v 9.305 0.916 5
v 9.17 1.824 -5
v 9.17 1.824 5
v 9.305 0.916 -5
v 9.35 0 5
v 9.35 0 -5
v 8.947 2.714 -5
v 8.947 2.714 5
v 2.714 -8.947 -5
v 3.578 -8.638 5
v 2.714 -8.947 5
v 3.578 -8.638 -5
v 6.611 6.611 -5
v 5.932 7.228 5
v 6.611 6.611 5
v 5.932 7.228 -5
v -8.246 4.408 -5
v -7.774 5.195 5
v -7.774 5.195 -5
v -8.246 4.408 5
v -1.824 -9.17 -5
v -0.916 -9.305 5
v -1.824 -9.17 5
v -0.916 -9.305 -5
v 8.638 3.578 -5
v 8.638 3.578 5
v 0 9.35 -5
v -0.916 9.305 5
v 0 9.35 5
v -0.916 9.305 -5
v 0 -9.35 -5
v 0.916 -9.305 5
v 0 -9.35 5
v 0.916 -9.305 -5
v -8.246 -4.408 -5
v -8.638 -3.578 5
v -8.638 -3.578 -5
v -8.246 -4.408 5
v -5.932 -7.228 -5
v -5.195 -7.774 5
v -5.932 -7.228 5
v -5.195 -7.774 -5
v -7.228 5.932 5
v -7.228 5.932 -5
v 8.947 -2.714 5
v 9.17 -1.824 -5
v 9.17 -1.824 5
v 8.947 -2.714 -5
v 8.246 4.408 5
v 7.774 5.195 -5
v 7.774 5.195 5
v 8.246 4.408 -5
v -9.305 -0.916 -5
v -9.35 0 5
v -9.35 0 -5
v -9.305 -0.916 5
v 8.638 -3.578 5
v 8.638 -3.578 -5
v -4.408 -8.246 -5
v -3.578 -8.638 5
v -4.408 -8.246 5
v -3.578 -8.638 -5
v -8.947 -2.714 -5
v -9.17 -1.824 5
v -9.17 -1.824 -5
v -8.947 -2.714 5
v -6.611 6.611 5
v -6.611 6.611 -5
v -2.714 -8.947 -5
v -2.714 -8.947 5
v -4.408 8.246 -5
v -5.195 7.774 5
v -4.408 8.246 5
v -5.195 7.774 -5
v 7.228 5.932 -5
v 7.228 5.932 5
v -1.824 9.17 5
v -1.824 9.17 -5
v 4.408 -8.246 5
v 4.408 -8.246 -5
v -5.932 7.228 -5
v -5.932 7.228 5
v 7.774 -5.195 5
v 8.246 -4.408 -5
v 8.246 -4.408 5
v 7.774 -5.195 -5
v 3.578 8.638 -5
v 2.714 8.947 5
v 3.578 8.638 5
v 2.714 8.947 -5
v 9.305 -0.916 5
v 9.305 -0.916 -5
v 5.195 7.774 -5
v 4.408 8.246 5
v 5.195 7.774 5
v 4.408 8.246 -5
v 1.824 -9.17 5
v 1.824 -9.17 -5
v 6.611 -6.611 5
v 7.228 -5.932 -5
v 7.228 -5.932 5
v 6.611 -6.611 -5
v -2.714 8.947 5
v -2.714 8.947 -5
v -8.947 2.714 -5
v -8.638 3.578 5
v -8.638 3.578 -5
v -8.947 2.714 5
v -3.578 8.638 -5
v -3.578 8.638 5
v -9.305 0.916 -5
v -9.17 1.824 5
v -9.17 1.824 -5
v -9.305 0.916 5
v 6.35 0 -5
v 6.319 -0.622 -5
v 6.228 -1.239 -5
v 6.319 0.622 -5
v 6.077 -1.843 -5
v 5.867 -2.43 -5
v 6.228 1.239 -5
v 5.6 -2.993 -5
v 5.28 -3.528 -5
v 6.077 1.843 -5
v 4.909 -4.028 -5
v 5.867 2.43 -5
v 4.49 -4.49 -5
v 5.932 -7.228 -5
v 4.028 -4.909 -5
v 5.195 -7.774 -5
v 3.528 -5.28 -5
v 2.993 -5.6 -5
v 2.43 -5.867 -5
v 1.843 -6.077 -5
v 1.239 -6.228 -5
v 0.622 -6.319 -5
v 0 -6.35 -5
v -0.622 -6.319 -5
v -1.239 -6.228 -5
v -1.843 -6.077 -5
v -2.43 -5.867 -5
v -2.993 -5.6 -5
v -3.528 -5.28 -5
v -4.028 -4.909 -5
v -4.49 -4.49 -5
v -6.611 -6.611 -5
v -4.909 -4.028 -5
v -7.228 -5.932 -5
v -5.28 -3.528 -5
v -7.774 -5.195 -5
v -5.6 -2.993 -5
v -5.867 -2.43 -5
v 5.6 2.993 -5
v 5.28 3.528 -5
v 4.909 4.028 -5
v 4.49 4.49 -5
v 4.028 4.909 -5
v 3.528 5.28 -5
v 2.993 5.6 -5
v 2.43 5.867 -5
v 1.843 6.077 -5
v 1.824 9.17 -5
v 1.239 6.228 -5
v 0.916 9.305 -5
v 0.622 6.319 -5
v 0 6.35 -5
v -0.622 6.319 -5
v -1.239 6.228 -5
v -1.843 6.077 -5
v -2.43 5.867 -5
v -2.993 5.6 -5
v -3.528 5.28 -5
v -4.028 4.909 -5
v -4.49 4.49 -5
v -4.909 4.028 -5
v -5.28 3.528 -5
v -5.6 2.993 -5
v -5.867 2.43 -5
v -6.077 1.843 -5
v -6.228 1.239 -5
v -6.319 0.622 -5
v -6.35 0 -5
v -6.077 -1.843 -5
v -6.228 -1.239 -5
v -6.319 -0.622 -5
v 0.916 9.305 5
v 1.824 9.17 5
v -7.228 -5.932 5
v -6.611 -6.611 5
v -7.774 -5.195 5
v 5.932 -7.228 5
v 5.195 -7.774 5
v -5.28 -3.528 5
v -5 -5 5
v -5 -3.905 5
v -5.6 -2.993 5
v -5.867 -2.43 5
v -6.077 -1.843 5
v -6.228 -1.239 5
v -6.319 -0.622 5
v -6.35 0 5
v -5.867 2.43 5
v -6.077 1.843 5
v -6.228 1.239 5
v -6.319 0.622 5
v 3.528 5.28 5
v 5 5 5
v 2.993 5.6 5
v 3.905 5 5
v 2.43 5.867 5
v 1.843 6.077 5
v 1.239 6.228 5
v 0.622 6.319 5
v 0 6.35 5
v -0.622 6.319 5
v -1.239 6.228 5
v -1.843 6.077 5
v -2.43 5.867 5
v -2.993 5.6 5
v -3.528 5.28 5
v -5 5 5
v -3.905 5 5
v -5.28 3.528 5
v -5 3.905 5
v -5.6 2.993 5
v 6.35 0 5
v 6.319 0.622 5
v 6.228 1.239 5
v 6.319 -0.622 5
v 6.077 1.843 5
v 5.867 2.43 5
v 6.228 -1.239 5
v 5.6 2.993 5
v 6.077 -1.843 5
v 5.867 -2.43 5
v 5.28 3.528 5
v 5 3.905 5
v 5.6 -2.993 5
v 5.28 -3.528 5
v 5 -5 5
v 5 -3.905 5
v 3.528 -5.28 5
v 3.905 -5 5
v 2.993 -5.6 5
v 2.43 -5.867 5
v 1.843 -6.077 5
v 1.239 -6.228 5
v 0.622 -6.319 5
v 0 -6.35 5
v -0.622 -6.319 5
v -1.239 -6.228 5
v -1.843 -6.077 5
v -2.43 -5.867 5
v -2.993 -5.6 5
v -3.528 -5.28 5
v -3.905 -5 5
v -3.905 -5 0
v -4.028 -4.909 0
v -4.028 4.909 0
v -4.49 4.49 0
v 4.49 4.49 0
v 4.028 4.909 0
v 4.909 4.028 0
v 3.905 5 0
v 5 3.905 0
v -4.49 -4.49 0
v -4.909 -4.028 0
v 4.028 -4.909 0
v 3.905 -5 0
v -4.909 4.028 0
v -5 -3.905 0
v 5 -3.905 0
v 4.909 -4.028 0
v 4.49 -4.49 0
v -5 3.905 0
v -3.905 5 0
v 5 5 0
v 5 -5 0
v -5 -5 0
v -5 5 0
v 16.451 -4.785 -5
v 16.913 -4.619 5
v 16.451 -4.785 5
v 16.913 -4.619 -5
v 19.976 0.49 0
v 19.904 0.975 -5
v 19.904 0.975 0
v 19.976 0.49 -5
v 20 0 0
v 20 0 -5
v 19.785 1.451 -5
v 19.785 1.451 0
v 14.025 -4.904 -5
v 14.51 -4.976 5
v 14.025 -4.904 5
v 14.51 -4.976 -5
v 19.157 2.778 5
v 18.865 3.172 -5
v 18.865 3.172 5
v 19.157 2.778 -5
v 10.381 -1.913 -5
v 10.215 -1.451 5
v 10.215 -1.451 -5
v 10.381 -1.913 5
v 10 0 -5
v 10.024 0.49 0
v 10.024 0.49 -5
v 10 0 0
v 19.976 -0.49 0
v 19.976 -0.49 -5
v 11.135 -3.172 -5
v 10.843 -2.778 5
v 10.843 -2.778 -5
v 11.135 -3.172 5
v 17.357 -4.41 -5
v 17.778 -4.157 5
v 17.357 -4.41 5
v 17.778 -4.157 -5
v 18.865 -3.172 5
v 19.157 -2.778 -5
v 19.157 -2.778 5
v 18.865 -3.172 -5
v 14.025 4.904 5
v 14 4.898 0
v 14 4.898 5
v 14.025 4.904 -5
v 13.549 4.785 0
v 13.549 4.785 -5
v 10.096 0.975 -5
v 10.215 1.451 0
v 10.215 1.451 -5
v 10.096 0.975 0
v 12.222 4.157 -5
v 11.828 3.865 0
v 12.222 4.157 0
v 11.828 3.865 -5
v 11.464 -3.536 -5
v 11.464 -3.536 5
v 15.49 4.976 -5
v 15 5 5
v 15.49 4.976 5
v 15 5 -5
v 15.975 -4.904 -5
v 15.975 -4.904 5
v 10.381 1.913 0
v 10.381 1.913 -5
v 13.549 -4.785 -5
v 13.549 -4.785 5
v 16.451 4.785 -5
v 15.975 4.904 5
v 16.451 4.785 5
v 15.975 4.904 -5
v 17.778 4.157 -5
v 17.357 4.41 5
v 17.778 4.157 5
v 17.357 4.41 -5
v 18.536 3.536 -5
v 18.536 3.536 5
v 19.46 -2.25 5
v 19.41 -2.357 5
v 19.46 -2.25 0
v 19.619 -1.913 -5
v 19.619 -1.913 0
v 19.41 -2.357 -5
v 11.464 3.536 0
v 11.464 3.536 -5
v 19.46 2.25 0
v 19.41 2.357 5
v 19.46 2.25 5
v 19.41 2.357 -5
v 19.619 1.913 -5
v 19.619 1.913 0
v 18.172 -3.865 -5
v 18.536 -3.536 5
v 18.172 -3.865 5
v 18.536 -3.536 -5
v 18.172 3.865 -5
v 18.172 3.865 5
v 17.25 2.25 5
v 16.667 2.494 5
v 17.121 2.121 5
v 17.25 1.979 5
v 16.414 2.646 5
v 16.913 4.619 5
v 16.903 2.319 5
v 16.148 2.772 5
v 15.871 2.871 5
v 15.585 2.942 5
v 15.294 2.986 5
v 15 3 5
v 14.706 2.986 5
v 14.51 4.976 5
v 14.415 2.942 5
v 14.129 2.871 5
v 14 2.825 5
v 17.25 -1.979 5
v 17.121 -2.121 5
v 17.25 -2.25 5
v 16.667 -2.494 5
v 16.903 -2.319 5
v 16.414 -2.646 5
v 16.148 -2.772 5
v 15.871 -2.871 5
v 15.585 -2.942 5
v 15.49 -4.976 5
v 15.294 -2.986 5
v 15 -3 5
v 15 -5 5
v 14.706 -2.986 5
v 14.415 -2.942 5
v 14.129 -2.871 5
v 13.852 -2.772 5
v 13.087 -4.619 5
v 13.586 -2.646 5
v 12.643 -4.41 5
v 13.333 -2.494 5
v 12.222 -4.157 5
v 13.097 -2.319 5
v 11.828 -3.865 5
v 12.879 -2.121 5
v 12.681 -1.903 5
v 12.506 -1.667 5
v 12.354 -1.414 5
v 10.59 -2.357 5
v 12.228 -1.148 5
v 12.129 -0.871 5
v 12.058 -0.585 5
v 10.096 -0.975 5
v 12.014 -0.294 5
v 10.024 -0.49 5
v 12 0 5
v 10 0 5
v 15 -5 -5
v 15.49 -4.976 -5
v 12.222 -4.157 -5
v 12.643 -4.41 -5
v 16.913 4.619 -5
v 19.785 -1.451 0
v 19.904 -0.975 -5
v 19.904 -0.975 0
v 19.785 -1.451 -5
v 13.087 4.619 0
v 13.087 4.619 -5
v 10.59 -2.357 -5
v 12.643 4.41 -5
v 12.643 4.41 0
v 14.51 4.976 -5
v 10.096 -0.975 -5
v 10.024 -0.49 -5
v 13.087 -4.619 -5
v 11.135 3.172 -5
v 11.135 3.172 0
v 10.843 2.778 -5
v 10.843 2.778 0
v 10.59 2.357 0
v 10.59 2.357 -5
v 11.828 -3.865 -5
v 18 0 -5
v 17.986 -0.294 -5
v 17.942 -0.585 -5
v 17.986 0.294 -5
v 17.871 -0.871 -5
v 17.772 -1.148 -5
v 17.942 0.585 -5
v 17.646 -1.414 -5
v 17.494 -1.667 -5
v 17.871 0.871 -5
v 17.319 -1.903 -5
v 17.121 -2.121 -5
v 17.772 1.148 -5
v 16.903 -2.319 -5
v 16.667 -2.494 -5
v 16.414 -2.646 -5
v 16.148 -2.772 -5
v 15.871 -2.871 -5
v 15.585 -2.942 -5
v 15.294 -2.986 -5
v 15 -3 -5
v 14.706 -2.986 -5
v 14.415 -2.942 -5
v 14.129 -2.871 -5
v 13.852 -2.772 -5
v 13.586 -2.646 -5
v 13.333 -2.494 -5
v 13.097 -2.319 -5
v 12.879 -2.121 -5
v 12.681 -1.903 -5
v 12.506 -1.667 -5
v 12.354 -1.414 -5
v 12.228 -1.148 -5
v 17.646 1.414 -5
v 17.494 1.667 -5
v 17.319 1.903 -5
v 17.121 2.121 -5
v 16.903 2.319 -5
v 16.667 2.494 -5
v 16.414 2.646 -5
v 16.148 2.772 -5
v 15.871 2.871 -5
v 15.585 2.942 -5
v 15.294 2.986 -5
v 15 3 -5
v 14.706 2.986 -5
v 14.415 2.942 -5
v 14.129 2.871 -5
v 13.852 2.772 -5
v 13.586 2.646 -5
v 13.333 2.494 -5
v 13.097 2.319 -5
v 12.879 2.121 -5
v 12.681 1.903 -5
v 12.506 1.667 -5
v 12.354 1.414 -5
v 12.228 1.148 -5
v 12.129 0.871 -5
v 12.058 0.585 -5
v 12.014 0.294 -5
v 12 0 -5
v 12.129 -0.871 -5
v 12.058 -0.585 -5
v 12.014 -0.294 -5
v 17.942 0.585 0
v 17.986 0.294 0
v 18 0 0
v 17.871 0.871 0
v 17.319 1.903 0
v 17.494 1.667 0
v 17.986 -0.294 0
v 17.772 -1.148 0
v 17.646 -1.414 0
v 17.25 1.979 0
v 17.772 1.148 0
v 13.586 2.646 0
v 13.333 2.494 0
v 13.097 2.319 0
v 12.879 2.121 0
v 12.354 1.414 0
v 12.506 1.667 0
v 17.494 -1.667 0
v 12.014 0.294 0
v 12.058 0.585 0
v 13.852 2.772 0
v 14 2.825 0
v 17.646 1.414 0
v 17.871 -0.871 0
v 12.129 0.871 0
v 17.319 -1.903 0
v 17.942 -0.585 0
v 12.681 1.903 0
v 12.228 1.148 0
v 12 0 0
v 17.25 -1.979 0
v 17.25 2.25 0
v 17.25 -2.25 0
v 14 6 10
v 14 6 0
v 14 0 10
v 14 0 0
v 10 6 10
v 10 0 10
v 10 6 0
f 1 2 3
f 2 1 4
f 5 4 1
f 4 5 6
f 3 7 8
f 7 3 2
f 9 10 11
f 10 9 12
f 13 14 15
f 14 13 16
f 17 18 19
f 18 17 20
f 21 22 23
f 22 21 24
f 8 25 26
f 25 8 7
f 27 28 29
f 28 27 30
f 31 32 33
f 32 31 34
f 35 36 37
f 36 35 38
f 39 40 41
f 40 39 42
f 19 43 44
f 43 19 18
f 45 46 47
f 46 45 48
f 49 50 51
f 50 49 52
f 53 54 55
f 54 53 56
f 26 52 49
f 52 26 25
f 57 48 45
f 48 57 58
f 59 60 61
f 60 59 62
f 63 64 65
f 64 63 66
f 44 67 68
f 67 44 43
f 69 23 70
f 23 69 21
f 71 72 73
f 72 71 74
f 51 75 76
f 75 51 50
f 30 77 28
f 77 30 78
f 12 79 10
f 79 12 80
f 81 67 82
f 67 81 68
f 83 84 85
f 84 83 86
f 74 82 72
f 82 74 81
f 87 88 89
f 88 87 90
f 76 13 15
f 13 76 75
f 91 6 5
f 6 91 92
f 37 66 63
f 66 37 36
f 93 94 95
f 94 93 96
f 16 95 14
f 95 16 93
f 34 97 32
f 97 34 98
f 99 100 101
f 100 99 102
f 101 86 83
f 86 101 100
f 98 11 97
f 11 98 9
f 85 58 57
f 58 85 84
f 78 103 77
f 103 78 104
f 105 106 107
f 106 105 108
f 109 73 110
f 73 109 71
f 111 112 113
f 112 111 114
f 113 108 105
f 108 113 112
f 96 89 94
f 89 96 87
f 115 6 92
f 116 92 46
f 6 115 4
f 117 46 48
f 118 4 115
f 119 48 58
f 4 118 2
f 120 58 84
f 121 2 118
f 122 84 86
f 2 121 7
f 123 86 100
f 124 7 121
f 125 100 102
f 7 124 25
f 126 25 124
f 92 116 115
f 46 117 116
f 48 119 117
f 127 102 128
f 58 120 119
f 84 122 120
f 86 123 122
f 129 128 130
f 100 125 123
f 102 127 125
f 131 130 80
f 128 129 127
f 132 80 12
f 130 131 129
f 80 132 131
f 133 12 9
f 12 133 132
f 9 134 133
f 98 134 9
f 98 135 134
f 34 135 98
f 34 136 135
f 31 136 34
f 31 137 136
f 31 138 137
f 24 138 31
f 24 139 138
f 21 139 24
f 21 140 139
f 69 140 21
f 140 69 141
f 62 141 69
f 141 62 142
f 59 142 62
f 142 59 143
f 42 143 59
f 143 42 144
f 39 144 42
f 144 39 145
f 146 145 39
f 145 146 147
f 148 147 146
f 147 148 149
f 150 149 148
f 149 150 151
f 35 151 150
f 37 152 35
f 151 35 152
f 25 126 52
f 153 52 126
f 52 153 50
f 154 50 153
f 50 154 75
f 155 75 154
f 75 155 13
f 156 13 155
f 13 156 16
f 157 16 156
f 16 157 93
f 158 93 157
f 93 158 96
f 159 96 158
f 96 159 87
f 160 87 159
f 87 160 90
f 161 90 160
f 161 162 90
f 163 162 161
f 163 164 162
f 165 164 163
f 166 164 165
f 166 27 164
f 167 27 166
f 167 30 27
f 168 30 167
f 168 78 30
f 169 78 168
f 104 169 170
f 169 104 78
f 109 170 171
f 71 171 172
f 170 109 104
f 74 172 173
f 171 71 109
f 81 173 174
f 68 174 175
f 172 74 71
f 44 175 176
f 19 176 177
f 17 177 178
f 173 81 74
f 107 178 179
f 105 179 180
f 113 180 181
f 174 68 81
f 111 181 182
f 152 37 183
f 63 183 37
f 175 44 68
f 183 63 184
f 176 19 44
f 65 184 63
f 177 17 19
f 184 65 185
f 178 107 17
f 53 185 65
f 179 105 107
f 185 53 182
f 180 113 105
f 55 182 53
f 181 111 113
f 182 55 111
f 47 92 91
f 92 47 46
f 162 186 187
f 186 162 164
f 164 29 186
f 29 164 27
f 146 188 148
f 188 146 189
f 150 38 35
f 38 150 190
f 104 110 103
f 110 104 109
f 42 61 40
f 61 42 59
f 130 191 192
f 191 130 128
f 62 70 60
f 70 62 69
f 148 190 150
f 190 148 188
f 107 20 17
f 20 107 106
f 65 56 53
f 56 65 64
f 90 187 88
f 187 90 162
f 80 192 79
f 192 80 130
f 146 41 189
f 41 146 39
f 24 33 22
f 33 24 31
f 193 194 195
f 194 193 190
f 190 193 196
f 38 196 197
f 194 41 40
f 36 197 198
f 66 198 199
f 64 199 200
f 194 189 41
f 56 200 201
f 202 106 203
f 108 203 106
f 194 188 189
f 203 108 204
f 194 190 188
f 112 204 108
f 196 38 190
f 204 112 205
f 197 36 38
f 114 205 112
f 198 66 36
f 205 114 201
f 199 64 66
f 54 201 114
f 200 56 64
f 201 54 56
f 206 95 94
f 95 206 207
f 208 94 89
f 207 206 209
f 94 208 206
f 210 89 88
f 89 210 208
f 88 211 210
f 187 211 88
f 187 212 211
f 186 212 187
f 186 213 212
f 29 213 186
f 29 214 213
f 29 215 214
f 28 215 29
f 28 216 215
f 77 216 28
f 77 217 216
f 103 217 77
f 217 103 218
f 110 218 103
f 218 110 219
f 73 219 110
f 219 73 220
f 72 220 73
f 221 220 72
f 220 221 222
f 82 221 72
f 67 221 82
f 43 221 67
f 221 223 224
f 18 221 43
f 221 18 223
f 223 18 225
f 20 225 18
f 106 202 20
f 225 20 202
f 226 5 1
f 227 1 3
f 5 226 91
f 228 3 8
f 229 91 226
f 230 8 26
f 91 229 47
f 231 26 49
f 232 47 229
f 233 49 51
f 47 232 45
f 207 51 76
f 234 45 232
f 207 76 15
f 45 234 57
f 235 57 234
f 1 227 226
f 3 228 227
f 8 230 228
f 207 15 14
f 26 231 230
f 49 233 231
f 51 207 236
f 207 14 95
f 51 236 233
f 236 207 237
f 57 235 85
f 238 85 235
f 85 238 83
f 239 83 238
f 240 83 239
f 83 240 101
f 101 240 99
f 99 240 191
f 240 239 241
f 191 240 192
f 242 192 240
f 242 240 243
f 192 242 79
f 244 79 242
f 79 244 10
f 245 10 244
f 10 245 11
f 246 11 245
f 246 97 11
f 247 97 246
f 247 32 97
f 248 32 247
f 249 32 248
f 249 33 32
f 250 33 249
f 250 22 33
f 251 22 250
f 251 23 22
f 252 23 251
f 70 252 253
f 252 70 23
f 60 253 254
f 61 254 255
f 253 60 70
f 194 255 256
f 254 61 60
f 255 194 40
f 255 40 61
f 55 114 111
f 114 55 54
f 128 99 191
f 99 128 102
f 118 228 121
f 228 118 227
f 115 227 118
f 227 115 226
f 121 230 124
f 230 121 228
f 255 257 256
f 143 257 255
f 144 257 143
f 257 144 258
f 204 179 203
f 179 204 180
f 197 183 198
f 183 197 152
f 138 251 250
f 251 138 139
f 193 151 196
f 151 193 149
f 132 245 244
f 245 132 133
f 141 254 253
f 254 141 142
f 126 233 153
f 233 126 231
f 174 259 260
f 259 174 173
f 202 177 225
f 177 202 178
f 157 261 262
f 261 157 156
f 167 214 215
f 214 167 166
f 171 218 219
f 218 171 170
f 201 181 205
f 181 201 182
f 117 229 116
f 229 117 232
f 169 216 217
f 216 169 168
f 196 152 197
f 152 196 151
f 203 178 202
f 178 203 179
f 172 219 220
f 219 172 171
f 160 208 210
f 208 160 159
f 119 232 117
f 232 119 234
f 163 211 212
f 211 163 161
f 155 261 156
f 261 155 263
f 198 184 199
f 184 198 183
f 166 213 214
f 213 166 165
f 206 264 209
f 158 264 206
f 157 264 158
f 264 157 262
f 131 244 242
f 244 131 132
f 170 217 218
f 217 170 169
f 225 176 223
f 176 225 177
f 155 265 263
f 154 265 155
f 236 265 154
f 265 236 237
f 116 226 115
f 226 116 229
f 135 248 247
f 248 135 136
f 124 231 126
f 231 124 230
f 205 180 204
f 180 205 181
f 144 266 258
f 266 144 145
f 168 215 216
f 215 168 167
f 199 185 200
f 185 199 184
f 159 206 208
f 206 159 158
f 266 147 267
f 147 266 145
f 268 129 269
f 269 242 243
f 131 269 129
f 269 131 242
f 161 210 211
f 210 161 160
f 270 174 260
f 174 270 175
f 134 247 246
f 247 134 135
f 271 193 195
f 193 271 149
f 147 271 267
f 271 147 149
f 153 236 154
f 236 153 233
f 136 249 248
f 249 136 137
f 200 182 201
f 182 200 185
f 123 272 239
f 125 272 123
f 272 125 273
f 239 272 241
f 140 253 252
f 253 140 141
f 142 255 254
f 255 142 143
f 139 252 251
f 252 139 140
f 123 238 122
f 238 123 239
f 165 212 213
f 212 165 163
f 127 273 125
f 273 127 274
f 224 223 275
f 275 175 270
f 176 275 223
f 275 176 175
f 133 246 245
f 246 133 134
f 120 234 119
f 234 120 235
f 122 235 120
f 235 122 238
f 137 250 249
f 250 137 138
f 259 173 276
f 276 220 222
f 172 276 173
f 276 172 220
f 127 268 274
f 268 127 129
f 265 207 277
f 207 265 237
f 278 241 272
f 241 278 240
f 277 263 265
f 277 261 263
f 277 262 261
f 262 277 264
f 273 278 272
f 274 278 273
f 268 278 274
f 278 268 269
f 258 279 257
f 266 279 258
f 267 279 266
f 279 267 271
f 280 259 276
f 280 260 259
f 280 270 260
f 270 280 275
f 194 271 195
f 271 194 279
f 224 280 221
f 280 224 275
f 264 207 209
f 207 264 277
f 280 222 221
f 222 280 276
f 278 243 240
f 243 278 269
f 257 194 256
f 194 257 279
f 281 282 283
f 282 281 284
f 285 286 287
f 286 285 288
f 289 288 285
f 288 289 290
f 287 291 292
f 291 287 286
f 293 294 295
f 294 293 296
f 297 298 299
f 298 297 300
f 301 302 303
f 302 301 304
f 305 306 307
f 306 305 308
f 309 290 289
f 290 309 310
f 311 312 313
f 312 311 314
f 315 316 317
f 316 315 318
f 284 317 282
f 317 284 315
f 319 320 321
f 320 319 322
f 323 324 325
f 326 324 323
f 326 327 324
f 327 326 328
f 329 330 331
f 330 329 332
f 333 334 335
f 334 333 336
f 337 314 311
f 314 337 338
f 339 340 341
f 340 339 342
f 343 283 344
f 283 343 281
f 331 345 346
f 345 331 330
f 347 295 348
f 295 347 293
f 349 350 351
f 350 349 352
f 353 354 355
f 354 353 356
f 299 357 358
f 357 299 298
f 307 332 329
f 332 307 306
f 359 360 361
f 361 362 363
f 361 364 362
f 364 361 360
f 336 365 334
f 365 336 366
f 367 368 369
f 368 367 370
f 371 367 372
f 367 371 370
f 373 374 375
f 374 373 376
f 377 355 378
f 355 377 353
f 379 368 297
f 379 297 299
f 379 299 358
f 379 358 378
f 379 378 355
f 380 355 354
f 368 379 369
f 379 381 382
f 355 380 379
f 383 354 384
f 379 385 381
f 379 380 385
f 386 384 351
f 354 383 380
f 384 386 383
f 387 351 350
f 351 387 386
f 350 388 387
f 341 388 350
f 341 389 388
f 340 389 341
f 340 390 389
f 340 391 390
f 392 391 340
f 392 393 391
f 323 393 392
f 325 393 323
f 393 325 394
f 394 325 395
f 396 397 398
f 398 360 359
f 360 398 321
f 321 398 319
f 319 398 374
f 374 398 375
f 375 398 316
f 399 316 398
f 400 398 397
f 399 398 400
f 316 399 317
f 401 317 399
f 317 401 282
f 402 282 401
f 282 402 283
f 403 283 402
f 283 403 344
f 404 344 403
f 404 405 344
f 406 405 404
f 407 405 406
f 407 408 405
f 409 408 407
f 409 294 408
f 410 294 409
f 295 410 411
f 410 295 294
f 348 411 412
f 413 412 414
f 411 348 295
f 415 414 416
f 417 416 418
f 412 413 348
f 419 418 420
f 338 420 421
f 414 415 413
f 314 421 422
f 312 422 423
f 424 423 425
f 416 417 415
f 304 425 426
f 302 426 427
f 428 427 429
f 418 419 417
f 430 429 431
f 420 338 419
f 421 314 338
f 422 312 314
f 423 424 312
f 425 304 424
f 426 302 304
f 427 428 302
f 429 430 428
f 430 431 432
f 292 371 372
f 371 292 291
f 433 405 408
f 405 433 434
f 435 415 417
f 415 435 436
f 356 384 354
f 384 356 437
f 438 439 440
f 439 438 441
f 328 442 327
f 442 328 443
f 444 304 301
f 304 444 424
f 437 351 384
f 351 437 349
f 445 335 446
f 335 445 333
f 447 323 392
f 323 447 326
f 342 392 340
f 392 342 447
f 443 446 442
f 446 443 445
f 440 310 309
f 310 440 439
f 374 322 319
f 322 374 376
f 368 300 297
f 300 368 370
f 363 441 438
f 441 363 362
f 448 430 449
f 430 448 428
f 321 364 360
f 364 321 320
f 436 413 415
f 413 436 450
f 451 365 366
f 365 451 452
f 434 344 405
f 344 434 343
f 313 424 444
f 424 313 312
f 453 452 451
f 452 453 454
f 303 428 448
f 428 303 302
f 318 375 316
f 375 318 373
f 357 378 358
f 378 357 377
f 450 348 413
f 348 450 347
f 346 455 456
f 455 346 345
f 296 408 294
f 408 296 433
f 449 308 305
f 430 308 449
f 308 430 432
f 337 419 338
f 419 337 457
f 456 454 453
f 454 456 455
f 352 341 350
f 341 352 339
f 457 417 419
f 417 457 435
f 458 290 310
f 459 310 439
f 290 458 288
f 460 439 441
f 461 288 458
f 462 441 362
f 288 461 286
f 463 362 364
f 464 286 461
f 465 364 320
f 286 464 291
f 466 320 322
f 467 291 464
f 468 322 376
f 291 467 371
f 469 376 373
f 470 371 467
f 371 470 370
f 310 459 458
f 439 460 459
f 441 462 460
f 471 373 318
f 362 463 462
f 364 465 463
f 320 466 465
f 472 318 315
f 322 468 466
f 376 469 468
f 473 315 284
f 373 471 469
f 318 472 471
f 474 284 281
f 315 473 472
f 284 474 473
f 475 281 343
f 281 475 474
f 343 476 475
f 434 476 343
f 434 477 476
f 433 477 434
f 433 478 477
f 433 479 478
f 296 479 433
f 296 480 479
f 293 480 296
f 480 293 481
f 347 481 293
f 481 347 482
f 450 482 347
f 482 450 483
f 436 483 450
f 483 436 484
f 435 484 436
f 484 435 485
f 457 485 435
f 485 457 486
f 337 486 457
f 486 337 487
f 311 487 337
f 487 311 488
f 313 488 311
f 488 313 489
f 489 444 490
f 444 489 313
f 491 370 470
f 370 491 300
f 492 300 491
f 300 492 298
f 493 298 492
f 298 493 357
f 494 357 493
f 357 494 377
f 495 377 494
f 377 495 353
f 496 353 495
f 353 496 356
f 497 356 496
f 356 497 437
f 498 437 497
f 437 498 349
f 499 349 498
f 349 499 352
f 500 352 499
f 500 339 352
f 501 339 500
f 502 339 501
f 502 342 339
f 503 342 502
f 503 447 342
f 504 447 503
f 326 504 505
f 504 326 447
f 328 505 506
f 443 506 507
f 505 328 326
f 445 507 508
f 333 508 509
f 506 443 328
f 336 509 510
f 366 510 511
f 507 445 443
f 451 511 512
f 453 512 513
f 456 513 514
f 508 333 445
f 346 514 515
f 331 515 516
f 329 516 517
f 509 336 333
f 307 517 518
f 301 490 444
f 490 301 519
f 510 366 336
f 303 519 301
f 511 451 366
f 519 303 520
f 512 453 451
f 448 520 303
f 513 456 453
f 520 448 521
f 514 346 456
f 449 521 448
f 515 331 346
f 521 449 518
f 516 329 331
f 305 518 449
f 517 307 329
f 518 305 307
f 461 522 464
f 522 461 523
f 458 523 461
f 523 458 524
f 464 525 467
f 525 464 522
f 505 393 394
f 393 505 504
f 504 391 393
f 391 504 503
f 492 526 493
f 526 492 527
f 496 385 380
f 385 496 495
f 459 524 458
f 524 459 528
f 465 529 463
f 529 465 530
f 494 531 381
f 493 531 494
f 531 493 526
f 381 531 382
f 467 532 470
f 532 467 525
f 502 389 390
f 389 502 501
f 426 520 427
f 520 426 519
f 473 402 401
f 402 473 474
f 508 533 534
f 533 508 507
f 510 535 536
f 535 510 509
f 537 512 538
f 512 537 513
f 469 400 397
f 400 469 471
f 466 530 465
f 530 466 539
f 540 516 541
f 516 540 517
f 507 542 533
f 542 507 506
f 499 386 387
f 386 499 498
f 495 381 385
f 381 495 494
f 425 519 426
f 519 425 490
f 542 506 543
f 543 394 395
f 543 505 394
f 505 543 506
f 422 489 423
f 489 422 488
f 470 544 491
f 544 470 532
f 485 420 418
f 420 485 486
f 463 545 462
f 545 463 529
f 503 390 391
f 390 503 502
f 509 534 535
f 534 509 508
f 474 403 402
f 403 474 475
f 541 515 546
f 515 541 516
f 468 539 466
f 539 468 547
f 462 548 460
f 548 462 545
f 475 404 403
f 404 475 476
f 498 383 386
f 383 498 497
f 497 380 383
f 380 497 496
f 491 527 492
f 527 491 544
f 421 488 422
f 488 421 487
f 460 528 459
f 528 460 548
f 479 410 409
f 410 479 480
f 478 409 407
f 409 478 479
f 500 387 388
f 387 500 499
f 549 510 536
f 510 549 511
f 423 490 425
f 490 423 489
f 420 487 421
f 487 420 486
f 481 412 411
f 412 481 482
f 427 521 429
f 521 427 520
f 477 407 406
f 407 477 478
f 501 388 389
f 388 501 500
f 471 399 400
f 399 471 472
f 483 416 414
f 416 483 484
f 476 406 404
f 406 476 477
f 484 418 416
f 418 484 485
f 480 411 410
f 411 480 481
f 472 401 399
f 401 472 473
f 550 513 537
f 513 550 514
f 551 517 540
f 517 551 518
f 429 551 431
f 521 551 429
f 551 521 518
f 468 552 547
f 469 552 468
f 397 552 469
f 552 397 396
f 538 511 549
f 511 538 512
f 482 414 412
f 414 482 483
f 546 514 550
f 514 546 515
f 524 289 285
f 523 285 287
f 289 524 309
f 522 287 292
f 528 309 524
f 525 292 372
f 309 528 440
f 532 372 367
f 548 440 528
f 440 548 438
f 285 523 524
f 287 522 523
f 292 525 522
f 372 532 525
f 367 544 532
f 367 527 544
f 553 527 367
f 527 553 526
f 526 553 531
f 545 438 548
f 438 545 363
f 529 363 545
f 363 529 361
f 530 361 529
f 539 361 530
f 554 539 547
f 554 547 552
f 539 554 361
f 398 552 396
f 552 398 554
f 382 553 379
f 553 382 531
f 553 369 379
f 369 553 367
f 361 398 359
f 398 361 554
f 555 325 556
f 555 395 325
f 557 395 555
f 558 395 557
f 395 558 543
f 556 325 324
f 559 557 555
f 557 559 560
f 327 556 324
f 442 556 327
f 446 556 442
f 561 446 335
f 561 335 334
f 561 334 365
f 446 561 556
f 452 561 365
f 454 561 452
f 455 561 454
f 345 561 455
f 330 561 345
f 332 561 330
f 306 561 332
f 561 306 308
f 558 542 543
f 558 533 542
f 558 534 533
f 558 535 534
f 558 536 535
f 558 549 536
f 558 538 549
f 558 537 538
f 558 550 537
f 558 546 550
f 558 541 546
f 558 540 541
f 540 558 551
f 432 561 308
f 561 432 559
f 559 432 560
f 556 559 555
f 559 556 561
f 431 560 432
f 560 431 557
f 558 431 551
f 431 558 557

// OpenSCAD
// Snap-on Clip for Lab Stand Rod and Tubing
// Orientation: Flat on XY plane, building up in +Z.
// Units: Millimetres.

// --- Dimensions ---
// Rod Stand
$rod_diameter = 12.7;
$rod_wall_thickness = 3;
$rod_outer_diameter = $rod_diameter + 2 * $rod_wall_thickness; // 18.7
$rod_ring_height = 10;

// Tubing
$tubing_inner_diameter = 6;
$tubing_wall_thickness = 2;
$tubing_outer_diameter = $tubing_inner_diameter + 2 * $tubing_wall_thickness; // 10
$tubing_ring_height = 10;

// Bridge
$bridge_width_x = 4; // From x=8 to x=12
$bridge_width_y = 6;
$bridge_height = 10;

// Cutout Dimensions
$rod_cutout_width = 10;
$rod_cutout_y_limit = $rod_cutout_width / 2; // 5

$tubing_cutout_width = 4.5;
$tubing_cutout_y_limit = $tubing_cutout_width / 2; // 2.25

// Positioning
$rod_center_x = 0;
$rod_center_y = 0;

$tubing_center_x = 15;
$tubing_center_y = 0;

// --- Generation ---
$fn = 64;

// Helper function to create a ring with a cutout
// Arguments: cx, cy, outer_d, inner_d, height, cut_width, cut_y_limit, cut_side (-1 for left, 1 for right)
module ring_with_cutout(cx, cy, outer_d, inner_d, height, cut_width, cut_y_limit, cut_side) {
    difference() {
        // Main Ring Body
        translate([cx, cy, 0]) {
            cylinder(h = height, d = outer_d, center = true);
        }
        
        // Inner Hole
        translate([cx, cy, 0]) {
            cylinder(h = height + 0.1, d = inner_d, center = true);
        }
        
        // Cutout (Rectangular void)
        // We subtract a block that covers the cutout area.
        // To ensure clean cutting, we extend the block slightly in Z (0.1mm)
        translate([cx, cy, 0]) {
            if (cut_side == -1) {
                // Cut on -X side (Left)
                // Region: x < cx, y between -cut_y_limit and +cut_y_limit
                translate([-cut_width/2, -cut_y_limit, 0]) {
                    cube([cut_width, cut_y_limit * 2, height + 0.1]);
                }
            } else {
                // Cut on +X side (Right)
                // Region: x > cx, y between -cut_y_limit and +cut_y_limit
                translate([cut_width/2, -cut_y_limit, 0]) {
                    cube([cut_width, cut_y_limit * 2, height + 0.1]);
                }
            }
        }
    }
}

// 1. Rod Ring
// Centered at (0,0). Cut on -X side.
ring_with_cutout(
    $rod_center_x, 
    $rod_center_y, 
    $rod_outer_diameter, 
    $rod_diameter, 
    $rod_ring_height, 
    $rod_cutout_width, 
    $rod_cutout_y_limit, 
    -1 // Left side
);

// 2. Tubing Ring
// Centered at (15,0). Cut on +X side.
ring_with_cutout(
    $tubing_center_x, 
    $tubing_center_y, 
    $tubing_outer_diameter, 
    $tubing_inner_diameter, 
    $tubing_ring_height, 
    $tubing_cutout_width, 
    $tubing_cutout_y_limit, 
    1 // Right side
);

// 3. Solid Bridge
// Specification: 6 mm wide (Y), joins x=8 and x=12.
// Center X = (8 + 12) / 2 = 10.
// Width X = 4.
// Width Y = 6.
// Height = 10.
// Position Z = 0 (resting on bed).
translate([10, 0, 0]) {
    cube([
        $bridge_width_x, 
        $bridge_width_y, 
        $bridge_height
    ]);
}
